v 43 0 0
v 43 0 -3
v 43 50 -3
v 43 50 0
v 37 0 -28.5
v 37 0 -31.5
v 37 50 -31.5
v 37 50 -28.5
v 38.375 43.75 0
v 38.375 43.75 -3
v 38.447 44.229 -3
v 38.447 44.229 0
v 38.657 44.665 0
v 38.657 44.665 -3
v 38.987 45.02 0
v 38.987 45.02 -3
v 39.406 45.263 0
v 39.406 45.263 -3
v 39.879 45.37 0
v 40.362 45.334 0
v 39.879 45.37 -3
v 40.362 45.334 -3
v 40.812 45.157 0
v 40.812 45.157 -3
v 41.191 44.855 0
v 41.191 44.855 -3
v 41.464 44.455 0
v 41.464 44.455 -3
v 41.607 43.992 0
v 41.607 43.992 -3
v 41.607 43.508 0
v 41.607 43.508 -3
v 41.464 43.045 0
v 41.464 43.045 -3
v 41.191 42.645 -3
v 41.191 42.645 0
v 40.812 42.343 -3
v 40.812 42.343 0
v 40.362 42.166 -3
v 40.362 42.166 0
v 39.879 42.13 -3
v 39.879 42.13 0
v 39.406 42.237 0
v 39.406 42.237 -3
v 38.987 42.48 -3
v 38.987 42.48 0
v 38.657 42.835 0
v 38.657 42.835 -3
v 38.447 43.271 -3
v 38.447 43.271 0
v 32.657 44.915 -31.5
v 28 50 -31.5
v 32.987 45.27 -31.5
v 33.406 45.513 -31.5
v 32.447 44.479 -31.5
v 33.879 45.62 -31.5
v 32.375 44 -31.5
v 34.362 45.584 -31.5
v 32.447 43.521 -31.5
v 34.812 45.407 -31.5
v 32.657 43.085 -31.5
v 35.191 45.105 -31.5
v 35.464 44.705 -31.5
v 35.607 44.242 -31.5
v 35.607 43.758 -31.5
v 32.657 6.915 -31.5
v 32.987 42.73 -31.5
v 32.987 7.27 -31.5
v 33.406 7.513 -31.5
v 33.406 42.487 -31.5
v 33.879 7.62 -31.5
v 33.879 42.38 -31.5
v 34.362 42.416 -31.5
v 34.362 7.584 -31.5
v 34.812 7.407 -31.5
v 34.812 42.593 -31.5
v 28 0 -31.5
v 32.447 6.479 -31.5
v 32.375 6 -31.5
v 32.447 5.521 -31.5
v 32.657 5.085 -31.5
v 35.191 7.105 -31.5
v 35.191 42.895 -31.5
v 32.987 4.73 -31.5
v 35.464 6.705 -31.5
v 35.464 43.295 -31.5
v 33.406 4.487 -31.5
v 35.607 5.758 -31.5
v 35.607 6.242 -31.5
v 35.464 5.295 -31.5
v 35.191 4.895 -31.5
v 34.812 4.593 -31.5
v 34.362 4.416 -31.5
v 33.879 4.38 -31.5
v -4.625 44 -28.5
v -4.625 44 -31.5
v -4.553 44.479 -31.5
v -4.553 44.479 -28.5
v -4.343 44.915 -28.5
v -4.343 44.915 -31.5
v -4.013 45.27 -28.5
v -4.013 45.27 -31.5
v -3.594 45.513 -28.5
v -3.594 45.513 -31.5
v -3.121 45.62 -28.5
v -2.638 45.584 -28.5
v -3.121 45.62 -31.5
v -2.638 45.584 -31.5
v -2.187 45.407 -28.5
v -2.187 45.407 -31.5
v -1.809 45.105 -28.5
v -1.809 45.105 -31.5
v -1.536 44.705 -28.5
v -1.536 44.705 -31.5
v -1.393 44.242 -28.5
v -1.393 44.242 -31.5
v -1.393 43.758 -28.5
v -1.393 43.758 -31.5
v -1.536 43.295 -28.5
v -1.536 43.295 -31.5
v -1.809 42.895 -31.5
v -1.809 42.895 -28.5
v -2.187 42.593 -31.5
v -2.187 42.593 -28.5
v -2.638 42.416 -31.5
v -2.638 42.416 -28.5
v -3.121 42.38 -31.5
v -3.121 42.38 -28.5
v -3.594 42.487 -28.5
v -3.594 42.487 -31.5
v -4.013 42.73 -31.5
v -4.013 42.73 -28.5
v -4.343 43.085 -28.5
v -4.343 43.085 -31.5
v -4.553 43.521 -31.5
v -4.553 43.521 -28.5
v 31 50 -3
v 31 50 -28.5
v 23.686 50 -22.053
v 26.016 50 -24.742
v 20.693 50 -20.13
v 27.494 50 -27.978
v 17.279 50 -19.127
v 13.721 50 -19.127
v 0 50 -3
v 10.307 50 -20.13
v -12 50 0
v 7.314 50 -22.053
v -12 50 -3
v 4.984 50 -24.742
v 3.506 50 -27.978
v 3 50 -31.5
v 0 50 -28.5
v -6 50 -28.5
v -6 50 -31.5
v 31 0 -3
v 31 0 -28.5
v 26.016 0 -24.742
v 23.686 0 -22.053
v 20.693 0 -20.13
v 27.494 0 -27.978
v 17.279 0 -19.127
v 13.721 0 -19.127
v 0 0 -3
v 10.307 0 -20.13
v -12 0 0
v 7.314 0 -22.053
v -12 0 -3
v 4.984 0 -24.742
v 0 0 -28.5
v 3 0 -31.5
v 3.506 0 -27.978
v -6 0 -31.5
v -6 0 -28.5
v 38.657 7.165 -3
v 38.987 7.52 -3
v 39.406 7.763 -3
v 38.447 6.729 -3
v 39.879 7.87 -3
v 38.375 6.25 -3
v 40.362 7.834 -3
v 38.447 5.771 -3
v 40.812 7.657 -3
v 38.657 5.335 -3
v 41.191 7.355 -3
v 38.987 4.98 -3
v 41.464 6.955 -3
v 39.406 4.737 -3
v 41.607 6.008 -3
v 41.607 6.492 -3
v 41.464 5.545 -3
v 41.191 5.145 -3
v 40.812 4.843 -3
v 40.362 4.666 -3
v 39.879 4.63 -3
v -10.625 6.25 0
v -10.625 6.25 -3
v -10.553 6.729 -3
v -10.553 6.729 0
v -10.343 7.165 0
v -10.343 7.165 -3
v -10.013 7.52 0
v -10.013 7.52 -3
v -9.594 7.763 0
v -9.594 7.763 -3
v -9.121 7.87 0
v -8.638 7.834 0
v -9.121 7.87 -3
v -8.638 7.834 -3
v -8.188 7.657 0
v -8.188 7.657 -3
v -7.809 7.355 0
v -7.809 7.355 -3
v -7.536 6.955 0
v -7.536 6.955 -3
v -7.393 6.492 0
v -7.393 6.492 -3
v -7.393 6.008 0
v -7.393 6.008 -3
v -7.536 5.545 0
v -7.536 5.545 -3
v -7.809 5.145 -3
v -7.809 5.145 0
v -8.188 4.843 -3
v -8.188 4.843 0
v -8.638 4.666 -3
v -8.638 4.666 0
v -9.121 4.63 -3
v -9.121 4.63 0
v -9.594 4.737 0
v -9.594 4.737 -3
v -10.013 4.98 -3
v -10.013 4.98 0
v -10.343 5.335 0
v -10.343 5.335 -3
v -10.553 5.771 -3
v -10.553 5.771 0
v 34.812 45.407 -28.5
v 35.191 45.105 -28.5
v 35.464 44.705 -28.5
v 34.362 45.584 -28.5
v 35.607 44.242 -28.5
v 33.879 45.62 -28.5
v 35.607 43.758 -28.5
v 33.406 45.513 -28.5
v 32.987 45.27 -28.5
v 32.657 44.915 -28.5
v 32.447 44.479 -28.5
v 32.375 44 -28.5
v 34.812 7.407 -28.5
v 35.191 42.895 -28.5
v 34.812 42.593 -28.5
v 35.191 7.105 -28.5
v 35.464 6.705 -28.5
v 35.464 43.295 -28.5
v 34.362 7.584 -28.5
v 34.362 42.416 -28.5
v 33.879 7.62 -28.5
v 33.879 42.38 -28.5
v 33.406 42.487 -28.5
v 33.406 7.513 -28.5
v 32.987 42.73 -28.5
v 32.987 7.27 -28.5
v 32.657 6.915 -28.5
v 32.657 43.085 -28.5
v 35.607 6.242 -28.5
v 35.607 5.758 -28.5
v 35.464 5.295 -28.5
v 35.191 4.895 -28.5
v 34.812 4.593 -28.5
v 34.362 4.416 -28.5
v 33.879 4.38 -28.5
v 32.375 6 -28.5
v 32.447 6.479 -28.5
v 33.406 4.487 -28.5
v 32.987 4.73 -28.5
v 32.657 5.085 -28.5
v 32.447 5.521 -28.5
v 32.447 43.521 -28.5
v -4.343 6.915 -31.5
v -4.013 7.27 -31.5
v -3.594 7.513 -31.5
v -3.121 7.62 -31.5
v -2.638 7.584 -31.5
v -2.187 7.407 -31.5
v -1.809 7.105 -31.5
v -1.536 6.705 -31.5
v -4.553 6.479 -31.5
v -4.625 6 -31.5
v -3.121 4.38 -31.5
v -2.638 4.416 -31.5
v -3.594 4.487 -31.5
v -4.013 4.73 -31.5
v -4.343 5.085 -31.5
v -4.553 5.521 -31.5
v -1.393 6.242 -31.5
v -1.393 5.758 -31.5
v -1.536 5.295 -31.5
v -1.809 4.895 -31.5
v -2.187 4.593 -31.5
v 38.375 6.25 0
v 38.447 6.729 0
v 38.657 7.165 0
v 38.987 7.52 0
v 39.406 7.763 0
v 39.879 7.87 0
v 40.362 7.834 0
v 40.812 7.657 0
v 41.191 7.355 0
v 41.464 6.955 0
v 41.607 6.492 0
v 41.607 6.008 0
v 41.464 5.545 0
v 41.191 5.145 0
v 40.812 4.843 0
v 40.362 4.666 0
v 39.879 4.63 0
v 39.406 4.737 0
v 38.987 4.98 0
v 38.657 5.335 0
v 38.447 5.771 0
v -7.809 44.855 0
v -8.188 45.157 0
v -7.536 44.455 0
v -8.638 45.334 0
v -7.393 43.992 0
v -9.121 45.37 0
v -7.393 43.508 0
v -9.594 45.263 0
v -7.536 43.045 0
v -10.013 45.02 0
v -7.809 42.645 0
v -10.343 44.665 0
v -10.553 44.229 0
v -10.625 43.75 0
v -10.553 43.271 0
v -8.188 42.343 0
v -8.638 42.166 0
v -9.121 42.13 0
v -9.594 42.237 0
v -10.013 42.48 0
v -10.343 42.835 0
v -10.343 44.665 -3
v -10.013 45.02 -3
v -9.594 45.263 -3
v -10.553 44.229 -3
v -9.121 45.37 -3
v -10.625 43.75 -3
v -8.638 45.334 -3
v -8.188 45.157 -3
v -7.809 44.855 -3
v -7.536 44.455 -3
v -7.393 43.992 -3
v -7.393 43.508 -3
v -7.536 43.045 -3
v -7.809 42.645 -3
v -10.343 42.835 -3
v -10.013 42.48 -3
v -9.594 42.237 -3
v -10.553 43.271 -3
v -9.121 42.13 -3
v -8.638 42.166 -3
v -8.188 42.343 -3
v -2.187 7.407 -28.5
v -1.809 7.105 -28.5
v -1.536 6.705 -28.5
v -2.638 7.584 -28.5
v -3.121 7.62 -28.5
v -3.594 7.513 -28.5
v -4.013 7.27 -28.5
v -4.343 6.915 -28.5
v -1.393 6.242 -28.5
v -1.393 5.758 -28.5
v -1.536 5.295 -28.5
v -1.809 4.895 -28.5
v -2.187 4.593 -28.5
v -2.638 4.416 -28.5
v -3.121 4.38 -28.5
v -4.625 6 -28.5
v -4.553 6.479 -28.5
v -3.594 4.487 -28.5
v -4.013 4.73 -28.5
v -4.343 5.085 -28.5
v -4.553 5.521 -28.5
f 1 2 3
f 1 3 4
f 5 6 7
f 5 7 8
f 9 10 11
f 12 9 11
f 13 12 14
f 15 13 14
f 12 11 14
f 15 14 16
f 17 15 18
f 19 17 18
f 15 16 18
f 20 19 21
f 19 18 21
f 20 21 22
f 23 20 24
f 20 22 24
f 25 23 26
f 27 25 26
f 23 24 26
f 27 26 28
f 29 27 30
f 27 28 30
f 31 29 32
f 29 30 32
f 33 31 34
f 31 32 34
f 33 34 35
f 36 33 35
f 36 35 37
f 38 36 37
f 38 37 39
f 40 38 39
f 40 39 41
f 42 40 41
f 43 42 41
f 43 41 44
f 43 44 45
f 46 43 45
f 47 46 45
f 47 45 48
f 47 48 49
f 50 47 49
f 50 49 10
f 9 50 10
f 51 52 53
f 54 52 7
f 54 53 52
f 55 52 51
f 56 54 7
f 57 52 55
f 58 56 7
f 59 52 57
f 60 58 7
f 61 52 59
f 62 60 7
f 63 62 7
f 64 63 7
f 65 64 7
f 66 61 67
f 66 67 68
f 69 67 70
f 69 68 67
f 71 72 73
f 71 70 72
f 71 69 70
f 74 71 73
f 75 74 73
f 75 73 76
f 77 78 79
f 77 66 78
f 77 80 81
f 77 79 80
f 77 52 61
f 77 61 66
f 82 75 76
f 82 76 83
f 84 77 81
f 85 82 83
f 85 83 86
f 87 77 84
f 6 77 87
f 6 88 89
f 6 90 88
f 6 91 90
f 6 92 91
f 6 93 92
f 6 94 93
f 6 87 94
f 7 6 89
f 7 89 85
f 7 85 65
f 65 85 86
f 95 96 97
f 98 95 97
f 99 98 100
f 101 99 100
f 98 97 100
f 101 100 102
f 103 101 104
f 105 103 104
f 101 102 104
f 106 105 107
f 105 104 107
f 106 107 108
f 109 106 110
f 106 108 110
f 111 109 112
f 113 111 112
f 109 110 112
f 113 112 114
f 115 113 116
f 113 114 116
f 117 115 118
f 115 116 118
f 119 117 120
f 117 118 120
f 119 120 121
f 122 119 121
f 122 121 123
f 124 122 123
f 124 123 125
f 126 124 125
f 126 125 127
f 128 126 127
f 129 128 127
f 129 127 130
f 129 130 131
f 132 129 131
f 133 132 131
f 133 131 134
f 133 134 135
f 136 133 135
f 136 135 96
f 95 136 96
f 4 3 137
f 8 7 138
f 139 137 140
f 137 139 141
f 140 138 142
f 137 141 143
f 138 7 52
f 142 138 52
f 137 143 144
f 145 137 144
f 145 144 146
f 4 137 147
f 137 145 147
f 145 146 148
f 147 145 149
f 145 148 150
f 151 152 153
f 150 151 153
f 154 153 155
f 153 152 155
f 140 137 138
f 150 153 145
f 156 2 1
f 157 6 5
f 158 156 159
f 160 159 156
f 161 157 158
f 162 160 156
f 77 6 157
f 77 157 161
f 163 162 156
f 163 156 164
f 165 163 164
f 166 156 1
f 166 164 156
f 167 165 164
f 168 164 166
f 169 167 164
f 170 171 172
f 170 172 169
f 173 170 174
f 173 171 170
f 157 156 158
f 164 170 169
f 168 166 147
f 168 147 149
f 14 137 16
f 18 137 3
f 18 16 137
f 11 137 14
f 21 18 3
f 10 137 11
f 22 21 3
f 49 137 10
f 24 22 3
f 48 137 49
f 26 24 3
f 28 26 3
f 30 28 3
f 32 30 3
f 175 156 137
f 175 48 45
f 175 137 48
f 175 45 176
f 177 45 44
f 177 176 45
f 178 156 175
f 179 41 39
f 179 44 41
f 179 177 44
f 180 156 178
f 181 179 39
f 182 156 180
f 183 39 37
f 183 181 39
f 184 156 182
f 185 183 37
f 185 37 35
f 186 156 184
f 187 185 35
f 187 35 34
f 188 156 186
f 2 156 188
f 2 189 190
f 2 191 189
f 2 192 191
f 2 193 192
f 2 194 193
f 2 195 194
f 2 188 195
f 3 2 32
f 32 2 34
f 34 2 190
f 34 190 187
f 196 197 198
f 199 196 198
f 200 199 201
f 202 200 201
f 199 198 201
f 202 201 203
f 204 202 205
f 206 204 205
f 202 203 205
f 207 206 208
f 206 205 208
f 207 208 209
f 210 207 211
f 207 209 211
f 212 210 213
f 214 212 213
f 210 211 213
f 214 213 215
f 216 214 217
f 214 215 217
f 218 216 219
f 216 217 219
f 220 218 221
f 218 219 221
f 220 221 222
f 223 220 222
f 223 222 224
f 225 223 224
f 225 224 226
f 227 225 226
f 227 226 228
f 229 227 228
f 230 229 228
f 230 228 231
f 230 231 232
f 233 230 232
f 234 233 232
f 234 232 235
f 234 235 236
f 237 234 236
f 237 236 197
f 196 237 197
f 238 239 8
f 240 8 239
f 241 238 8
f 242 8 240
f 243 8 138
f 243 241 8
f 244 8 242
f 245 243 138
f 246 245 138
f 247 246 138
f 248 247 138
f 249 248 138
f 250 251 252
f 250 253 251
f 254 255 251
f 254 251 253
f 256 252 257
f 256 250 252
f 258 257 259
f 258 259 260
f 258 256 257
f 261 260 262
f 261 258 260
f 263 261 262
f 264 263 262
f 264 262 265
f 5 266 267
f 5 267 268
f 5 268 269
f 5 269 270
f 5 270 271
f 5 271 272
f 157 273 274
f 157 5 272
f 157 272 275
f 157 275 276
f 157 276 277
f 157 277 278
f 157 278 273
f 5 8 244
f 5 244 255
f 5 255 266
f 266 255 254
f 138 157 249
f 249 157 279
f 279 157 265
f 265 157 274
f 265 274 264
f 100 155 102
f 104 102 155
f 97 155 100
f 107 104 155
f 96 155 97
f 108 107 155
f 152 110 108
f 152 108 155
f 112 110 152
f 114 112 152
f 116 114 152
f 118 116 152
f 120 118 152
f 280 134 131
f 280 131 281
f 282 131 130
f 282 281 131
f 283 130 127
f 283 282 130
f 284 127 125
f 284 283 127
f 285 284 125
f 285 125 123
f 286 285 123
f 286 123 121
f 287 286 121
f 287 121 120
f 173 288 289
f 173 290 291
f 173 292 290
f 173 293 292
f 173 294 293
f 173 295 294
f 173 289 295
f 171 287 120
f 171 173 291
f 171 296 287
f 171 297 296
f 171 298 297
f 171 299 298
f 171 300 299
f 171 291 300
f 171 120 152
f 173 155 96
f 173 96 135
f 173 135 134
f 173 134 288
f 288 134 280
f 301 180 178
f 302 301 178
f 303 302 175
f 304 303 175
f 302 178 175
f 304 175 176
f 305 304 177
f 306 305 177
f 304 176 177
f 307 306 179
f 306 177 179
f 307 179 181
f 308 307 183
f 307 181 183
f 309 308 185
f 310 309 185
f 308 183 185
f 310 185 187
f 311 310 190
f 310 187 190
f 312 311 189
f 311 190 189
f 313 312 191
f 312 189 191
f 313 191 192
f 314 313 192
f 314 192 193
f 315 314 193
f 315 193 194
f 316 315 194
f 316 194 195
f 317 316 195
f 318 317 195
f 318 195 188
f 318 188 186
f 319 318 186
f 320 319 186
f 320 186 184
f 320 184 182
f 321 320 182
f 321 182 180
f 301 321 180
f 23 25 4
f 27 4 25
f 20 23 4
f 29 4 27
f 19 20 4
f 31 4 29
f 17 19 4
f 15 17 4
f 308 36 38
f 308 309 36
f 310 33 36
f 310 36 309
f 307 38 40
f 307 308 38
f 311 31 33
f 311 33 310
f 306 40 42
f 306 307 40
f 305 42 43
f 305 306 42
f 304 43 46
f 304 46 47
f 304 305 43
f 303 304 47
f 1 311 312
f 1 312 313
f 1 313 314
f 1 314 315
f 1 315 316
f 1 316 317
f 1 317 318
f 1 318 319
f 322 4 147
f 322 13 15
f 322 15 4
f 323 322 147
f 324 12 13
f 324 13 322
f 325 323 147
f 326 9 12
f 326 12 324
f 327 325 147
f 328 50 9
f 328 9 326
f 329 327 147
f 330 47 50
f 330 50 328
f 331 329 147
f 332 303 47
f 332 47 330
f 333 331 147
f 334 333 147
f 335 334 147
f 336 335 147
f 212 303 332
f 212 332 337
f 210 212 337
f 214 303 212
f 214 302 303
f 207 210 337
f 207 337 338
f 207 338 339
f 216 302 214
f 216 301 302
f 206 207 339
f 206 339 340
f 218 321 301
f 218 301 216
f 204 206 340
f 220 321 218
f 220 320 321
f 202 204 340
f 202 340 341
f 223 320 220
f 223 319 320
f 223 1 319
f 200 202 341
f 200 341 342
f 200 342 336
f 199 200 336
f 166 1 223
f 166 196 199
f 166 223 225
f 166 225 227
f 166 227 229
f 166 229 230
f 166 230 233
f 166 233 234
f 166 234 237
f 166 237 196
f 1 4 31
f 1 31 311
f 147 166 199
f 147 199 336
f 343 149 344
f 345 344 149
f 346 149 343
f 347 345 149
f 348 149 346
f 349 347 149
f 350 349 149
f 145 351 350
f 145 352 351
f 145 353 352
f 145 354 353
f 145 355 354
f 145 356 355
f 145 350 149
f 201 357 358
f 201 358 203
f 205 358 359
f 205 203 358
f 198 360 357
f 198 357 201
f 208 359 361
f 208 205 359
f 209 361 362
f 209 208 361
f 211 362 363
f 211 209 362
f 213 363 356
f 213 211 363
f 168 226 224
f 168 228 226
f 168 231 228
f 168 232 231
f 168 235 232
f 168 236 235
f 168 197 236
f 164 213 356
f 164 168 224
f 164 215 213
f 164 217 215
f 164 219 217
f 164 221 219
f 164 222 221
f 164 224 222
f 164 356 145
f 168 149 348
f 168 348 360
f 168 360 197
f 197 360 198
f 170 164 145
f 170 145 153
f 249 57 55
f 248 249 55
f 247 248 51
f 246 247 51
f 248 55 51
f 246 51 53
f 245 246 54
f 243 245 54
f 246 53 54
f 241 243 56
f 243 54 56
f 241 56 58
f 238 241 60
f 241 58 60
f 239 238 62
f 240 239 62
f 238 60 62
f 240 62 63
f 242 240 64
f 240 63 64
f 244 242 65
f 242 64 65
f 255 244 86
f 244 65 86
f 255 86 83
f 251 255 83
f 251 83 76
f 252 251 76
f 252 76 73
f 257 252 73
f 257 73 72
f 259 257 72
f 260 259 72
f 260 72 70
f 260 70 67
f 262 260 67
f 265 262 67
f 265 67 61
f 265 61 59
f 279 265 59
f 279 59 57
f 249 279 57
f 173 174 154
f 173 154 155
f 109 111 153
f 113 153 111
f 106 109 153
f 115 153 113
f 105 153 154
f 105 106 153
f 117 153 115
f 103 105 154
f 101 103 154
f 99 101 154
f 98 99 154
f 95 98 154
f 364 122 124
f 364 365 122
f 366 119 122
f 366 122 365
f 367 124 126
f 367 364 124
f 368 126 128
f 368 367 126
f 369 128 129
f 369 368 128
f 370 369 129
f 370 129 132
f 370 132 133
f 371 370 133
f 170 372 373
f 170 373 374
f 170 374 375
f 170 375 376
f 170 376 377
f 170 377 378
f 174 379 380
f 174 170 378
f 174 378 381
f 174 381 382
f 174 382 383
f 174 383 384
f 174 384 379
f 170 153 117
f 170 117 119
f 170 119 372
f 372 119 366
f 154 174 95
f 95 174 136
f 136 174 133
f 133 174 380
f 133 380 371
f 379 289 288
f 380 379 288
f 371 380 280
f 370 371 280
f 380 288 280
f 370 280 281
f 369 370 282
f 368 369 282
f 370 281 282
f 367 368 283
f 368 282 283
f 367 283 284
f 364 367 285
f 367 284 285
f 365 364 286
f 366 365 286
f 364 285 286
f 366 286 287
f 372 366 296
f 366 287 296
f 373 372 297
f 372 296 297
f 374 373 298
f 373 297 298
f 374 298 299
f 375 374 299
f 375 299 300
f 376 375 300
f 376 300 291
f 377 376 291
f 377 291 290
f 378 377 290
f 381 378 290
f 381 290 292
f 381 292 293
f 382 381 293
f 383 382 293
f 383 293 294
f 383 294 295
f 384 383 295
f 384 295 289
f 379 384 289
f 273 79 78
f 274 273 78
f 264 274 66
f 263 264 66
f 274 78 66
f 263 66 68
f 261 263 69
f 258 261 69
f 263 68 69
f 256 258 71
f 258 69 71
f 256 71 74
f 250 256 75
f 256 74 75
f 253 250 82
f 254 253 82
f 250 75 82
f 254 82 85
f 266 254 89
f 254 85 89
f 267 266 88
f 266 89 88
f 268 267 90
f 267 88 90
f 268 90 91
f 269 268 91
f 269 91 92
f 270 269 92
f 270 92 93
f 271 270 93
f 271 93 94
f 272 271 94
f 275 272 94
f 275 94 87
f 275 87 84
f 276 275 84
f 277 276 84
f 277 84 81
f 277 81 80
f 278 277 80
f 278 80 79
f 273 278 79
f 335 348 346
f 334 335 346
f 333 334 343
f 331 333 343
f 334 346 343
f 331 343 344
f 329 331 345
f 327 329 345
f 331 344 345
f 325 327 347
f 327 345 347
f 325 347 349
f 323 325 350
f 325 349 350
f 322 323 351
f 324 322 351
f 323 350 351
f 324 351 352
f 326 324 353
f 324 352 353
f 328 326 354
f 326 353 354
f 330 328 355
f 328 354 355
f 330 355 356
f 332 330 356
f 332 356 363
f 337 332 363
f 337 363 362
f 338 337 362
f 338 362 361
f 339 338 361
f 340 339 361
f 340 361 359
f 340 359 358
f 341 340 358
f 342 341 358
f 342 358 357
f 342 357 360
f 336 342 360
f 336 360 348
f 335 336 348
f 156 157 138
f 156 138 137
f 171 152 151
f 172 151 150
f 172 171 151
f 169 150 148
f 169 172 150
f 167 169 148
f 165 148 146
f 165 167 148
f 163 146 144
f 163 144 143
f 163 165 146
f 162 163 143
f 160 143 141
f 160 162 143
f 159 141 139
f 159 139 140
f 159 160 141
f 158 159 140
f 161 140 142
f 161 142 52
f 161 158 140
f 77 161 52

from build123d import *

# Parameters (mm, degrees)
BOSS_EXTRU_2_DEPTH      = 50
ESQUISSE2_R             = 1.625
ENL_V_MAT_EXTRU_2_DEPTH = 6
ESQUISSE4_R             = 1.625
ENL_V_MAT_EXTRU_3_DEPTH = 14
ESQUISSE3_R             = 1.625
ENL_V_MAT_EXTRU_4_DEPTH = 14


with BuildPart() as part:
    # Esquisse1 → Boss.-Extru.2 (new body)
    with BuildSketch(Plane(origin=(0, 0, 0), x_dir=(1, 0, 0), z_dir=(0, 1, 0))):
        with BuildLine():
            Line((-6, 28.5), (-6, 31.5))
            Line((-6, 31.5), (3, 31.5))
            ThreePointArc((3, 31.5), (15.5, 19), (28, 31.5))
            Line((28, 31.5), (37, 31.5))
            Line((37, 31.5), (37, 28.5))
            Line((37, 28.5), (31, 28.5))
            Line((31, 28.5), (31, 3))
            Line((31, 3), (43, 3))
            Line((43, 3), (43, 0))
            Line((43, 0), (-12, 0))
            Line((-12, 0), (-12, 3))
            Line((-12, 3), (0, 3))
            Line((0, 3), (0, 28.5))
            Line((0, 28.5), (-6, 28.5))
        make_face()
    extrude(amount=BOSS_EXTRU_2_DEPTH)

    # Esquisse2 → Enlèv. mat.-Extru.2 (cut)
    with BuildSketch(Plane(origin=(0, 0, -31.5), x_dir=(-1, 0, 0), z_dir=(0, 0, -1))):
        with Locations((3, 44)):
            Circle(ESQUISSE2_R)
        with Locations((3, 6)):
            Circle(ESQUISSE2_R)
        with Locations((-34, 44)):
            Circle(ESQUISSE2_R)
        with Locations((-34, 6)):
            Circle(ESQUISSE2_R)
    extrude(amount=-ENL_V_MAT_EXTRU_2_DEPTH, mode=Mode.SUBTRACT)

    # Esquisse4 → Enlèv. mat.-Extru.3 (cut)
    with BuildSketch(Plane(origin=(0, 0, -3), x_dir=(-1, 0, 0), z_dir=(0, 0, -1))):
        with Locations((9, 6.25)):
            Circle(ESQUISSE4_R)
        with Locations((9, 43.75)):
            Circle(ESQUISSE4_R)
    extrude(amount=-ENL_V_MAT_EXTRU_3_DEPTH, mode=Mode.SUBTRACT)

    # Esquisse3 → Enlèv. mat.-Extru.4 (cut)
    with BuildSketch(Plane(origin=(0, 0, -3), x_dir=(-1, 0, 0), z_dir=(0, 0, -1))):
        with Locations((-40, 6.25)):
            Circle(ESQUISSE3_R)
        with Locations((-40, 43.75)):
            Circle(ESQUISSE3_R)
    extrude(amount=-ENL_V_MAT_EXTRU_4_DEPTH, mode=Mode.SUBTRACT)


solid = part.part
